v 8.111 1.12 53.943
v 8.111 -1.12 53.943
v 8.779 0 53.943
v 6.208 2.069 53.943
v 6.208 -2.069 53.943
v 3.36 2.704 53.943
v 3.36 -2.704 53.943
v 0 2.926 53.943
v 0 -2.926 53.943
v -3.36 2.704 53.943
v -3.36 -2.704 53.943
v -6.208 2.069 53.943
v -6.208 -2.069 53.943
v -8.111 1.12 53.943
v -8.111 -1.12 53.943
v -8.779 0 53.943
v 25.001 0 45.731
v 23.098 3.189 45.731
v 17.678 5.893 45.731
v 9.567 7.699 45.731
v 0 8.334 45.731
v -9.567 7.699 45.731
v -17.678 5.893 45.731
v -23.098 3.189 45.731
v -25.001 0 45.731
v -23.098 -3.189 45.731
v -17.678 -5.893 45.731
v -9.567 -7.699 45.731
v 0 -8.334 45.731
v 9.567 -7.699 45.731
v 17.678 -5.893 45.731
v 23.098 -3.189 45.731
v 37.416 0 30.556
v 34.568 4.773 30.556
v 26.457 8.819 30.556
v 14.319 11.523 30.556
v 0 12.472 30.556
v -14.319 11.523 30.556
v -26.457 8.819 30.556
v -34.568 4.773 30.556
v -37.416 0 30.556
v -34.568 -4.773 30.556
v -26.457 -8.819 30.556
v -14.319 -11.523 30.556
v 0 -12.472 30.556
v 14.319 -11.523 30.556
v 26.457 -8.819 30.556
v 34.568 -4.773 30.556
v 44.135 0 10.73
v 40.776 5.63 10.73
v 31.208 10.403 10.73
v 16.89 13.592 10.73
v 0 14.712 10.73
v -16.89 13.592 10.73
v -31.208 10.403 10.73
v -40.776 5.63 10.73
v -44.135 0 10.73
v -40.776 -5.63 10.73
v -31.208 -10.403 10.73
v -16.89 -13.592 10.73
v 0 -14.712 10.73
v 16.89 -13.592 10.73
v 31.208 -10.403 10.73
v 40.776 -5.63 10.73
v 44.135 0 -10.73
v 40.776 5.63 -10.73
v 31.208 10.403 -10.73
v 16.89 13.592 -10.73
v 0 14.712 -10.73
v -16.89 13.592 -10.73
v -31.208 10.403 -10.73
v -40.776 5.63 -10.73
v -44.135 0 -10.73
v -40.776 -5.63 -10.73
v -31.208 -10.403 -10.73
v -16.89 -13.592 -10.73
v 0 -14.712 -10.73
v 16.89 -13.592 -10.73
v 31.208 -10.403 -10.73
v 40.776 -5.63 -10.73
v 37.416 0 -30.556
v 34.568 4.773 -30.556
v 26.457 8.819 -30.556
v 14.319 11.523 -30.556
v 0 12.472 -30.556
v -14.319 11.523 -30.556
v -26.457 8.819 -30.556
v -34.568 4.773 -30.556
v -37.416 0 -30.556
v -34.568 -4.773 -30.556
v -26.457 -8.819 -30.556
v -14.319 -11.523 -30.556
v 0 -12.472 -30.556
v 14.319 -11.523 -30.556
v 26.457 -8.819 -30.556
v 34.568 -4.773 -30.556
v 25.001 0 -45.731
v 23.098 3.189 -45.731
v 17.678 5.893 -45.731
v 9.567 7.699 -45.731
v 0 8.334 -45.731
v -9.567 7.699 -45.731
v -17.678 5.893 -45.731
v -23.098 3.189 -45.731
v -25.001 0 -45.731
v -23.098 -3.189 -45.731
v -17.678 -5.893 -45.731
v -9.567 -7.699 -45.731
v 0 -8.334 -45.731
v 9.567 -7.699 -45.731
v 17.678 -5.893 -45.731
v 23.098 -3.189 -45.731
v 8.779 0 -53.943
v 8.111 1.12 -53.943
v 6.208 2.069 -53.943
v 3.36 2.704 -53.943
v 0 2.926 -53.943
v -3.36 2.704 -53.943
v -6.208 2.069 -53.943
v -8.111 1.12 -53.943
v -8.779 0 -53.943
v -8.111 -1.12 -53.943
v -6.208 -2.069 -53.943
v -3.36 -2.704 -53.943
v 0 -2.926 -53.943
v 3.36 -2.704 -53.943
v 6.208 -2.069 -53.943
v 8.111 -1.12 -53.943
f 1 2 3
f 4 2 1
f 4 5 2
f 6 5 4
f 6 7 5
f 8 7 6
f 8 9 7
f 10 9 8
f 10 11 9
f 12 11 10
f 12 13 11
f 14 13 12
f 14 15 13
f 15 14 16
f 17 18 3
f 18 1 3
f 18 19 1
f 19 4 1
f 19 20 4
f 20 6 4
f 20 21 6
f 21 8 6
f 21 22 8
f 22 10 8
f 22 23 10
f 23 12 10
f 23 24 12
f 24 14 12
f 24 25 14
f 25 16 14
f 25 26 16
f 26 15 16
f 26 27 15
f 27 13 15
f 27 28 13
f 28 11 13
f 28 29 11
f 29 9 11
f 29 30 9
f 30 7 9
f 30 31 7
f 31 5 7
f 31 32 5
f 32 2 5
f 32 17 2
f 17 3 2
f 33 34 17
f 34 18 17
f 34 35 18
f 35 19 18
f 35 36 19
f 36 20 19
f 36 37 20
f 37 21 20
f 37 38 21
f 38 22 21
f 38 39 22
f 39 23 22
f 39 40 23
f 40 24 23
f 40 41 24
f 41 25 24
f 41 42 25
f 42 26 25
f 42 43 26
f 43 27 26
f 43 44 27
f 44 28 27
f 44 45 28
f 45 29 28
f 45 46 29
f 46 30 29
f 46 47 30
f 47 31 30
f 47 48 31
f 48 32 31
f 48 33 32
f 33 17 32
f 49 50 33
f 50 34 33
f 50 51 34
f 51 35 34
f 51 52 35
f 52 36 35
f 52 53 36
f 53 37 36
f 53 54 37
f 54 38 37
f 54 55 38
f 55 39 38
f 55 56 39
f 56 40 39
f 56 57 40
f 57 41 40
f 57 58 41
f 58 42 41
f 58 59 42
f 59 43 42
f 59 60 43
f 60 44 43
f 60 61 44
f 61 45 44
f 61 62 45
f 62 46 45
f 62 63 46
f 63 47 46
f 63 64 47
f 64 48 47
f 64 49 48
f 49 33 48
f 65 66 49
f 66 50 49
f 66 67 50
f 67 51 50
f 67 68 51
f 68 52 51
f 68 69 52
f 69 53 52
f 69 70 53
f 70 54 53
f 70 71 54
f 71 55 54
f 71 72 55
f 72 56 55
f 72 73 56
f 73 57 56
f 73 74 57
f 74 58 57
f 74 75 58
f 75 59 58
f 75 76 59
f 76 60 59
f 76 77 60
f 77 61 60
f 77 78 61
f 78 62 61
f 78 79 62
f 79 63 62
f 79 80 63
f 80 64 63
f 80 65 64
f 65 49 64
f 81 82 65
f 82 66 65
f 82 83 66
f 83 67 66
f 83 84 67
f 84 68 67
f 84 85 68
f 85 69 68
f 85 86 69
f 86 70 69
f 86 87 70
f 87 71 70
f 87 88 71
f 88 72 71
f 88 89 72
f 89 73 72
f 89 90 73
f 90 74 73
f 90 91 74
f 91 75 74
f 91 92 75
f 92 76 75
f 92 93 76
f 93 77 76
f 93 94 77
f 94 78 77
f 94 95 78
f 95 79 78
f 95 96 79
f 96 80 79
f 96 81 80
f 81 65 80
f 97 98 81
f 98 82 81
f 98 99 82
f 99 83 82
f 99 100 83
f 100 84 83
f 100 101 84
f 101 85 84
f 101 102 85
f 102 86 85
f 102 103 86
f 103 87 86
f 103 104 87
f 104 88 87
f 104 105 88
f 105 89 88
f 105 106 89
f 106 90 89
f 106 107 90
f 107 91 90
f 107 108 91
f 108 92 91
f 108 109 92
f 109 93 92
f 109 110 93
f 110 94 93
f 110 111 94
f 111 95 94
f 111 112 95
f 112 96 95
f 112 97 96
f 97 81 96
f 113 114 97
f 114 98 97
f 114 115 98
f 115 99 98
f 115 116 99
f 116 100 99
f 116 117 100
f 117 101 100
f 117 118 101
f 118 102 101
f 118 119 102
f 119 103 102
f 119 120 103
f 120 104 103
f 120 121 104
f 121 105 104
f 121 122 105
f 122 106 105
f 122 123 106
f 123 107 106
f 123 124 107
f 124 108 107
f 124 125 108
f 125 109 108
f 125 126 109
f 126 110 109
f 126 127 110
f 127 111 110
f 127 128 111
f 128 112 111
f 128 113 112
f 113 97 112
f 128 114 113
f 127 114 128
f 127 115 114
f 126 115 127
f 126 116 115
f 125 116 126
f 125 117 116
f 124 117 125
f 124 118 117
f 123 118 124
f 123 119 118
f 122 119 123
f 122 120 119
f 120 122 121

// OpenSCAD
// Generated by SolidPython 1.0.1 on 2020-07-29 00:46:48


scale(v = [9, 3, 11]) {
	sphere(r = 5);
}
/***********************************************
*********      SolidPython code:      **********
************************************************
 
# import packages: SolidPython
from solid import *
from solid.utils import *
from itertools import chain, combinations, permutations


class Resize:

    def __init__(self, scad_file):
        self.scad_file = scad_file
        #self.scad_file = import_scad(scad_file)
        # cone/cylinder param:
        self.r1 = 0
        self.r2 = 0
        self.h = 0
        # rectangular prism param:
        self.w = 0
        self.l = 0
        # ellipse param:
        self.r = 0

    # import OpenScad code (file name corresponds to shape)


    # classify shape + parameters
    def assign(self, param1, param2, param3):
        if self.scad_file == 'cone.scad':
            self.r1 = param1
            self.r2 = param2
            self.h = param3
        elif self.scad_file == 'cylinder.scad':
            self.r1 = param1
            self.r2 = param2
            self.h = param3
        elif self.scad_file == 'rectangularPrism.scad':
            self.h = param1
            self.l = param2
            self.w = param3
        else:
            self.r = param1
            self.h = param2

    # resize parameters
    def iterate(self):
        x = range(3, 20, 2)
        i = 1
        if self.scad_file == 'cone.scad':
            tempList = list(permutations(x, 2))
            for temp in tempList:
                param1 = temp[0]
                param2 = temp[1]
                filepath = 'produced_scad_files/' + 'cone' + str(param1) + '_' + str(param2) + '_' + '.scad'
                scad_render_to_file(cylinder(h=param1, r1=param2, r2=0), filepath)

        elif self.scad_file == 'cylinder.scad':
            tempList = list(permutations(x, 3))
            for temp in tempList:
                param1 = temp[0]
                param2 = temp[1]
                filepath = 'produced_scad_files/' + 'cylinder' + str(param1) + '_' + str(param2) + '_' + '.scad'
                scad_render_to_file(cylinder(h=param1, r1=param2, r2=param2), filepath)

        elif self.scad_file == 'rectangularPrism.scad':
            tempList = list(permutations(x, 3))
            for temp in tempList:
                param1 = temp[0]
                param2 = temp[1]
                param3 = temp[2]
                filepath = 'produced_scad_files/' + 'rectangularPrism' + str(param1) + '_' + str(param2) + '_' + str(
                    param3) + '.scad'
                scad_render_to_file(cube(size=(param1, param2, param3)), filepath)

        elif self.scad_file == 'ellipse.scad':
            tempList = list(permutations(x, 4))
            for temp in tempList:
                param1 = temp[0]
                param2 = temp[1]
                param3 = temp[2]
                param4 = temp[3]
                filepath = 'produced_scad_files/' + 'ellipse' + str(param1) + '_' + str(param2) + '_' + str(param3) + '_' + str(param4) + '.scad'
                scad_render_to_file(scale([param1, param2, param3])(sphere(r=param4)), filepath)

    def render_to_scadfile(self):
        scad_render_to_file(scad, 'example.scad') 
 
************************************************/
